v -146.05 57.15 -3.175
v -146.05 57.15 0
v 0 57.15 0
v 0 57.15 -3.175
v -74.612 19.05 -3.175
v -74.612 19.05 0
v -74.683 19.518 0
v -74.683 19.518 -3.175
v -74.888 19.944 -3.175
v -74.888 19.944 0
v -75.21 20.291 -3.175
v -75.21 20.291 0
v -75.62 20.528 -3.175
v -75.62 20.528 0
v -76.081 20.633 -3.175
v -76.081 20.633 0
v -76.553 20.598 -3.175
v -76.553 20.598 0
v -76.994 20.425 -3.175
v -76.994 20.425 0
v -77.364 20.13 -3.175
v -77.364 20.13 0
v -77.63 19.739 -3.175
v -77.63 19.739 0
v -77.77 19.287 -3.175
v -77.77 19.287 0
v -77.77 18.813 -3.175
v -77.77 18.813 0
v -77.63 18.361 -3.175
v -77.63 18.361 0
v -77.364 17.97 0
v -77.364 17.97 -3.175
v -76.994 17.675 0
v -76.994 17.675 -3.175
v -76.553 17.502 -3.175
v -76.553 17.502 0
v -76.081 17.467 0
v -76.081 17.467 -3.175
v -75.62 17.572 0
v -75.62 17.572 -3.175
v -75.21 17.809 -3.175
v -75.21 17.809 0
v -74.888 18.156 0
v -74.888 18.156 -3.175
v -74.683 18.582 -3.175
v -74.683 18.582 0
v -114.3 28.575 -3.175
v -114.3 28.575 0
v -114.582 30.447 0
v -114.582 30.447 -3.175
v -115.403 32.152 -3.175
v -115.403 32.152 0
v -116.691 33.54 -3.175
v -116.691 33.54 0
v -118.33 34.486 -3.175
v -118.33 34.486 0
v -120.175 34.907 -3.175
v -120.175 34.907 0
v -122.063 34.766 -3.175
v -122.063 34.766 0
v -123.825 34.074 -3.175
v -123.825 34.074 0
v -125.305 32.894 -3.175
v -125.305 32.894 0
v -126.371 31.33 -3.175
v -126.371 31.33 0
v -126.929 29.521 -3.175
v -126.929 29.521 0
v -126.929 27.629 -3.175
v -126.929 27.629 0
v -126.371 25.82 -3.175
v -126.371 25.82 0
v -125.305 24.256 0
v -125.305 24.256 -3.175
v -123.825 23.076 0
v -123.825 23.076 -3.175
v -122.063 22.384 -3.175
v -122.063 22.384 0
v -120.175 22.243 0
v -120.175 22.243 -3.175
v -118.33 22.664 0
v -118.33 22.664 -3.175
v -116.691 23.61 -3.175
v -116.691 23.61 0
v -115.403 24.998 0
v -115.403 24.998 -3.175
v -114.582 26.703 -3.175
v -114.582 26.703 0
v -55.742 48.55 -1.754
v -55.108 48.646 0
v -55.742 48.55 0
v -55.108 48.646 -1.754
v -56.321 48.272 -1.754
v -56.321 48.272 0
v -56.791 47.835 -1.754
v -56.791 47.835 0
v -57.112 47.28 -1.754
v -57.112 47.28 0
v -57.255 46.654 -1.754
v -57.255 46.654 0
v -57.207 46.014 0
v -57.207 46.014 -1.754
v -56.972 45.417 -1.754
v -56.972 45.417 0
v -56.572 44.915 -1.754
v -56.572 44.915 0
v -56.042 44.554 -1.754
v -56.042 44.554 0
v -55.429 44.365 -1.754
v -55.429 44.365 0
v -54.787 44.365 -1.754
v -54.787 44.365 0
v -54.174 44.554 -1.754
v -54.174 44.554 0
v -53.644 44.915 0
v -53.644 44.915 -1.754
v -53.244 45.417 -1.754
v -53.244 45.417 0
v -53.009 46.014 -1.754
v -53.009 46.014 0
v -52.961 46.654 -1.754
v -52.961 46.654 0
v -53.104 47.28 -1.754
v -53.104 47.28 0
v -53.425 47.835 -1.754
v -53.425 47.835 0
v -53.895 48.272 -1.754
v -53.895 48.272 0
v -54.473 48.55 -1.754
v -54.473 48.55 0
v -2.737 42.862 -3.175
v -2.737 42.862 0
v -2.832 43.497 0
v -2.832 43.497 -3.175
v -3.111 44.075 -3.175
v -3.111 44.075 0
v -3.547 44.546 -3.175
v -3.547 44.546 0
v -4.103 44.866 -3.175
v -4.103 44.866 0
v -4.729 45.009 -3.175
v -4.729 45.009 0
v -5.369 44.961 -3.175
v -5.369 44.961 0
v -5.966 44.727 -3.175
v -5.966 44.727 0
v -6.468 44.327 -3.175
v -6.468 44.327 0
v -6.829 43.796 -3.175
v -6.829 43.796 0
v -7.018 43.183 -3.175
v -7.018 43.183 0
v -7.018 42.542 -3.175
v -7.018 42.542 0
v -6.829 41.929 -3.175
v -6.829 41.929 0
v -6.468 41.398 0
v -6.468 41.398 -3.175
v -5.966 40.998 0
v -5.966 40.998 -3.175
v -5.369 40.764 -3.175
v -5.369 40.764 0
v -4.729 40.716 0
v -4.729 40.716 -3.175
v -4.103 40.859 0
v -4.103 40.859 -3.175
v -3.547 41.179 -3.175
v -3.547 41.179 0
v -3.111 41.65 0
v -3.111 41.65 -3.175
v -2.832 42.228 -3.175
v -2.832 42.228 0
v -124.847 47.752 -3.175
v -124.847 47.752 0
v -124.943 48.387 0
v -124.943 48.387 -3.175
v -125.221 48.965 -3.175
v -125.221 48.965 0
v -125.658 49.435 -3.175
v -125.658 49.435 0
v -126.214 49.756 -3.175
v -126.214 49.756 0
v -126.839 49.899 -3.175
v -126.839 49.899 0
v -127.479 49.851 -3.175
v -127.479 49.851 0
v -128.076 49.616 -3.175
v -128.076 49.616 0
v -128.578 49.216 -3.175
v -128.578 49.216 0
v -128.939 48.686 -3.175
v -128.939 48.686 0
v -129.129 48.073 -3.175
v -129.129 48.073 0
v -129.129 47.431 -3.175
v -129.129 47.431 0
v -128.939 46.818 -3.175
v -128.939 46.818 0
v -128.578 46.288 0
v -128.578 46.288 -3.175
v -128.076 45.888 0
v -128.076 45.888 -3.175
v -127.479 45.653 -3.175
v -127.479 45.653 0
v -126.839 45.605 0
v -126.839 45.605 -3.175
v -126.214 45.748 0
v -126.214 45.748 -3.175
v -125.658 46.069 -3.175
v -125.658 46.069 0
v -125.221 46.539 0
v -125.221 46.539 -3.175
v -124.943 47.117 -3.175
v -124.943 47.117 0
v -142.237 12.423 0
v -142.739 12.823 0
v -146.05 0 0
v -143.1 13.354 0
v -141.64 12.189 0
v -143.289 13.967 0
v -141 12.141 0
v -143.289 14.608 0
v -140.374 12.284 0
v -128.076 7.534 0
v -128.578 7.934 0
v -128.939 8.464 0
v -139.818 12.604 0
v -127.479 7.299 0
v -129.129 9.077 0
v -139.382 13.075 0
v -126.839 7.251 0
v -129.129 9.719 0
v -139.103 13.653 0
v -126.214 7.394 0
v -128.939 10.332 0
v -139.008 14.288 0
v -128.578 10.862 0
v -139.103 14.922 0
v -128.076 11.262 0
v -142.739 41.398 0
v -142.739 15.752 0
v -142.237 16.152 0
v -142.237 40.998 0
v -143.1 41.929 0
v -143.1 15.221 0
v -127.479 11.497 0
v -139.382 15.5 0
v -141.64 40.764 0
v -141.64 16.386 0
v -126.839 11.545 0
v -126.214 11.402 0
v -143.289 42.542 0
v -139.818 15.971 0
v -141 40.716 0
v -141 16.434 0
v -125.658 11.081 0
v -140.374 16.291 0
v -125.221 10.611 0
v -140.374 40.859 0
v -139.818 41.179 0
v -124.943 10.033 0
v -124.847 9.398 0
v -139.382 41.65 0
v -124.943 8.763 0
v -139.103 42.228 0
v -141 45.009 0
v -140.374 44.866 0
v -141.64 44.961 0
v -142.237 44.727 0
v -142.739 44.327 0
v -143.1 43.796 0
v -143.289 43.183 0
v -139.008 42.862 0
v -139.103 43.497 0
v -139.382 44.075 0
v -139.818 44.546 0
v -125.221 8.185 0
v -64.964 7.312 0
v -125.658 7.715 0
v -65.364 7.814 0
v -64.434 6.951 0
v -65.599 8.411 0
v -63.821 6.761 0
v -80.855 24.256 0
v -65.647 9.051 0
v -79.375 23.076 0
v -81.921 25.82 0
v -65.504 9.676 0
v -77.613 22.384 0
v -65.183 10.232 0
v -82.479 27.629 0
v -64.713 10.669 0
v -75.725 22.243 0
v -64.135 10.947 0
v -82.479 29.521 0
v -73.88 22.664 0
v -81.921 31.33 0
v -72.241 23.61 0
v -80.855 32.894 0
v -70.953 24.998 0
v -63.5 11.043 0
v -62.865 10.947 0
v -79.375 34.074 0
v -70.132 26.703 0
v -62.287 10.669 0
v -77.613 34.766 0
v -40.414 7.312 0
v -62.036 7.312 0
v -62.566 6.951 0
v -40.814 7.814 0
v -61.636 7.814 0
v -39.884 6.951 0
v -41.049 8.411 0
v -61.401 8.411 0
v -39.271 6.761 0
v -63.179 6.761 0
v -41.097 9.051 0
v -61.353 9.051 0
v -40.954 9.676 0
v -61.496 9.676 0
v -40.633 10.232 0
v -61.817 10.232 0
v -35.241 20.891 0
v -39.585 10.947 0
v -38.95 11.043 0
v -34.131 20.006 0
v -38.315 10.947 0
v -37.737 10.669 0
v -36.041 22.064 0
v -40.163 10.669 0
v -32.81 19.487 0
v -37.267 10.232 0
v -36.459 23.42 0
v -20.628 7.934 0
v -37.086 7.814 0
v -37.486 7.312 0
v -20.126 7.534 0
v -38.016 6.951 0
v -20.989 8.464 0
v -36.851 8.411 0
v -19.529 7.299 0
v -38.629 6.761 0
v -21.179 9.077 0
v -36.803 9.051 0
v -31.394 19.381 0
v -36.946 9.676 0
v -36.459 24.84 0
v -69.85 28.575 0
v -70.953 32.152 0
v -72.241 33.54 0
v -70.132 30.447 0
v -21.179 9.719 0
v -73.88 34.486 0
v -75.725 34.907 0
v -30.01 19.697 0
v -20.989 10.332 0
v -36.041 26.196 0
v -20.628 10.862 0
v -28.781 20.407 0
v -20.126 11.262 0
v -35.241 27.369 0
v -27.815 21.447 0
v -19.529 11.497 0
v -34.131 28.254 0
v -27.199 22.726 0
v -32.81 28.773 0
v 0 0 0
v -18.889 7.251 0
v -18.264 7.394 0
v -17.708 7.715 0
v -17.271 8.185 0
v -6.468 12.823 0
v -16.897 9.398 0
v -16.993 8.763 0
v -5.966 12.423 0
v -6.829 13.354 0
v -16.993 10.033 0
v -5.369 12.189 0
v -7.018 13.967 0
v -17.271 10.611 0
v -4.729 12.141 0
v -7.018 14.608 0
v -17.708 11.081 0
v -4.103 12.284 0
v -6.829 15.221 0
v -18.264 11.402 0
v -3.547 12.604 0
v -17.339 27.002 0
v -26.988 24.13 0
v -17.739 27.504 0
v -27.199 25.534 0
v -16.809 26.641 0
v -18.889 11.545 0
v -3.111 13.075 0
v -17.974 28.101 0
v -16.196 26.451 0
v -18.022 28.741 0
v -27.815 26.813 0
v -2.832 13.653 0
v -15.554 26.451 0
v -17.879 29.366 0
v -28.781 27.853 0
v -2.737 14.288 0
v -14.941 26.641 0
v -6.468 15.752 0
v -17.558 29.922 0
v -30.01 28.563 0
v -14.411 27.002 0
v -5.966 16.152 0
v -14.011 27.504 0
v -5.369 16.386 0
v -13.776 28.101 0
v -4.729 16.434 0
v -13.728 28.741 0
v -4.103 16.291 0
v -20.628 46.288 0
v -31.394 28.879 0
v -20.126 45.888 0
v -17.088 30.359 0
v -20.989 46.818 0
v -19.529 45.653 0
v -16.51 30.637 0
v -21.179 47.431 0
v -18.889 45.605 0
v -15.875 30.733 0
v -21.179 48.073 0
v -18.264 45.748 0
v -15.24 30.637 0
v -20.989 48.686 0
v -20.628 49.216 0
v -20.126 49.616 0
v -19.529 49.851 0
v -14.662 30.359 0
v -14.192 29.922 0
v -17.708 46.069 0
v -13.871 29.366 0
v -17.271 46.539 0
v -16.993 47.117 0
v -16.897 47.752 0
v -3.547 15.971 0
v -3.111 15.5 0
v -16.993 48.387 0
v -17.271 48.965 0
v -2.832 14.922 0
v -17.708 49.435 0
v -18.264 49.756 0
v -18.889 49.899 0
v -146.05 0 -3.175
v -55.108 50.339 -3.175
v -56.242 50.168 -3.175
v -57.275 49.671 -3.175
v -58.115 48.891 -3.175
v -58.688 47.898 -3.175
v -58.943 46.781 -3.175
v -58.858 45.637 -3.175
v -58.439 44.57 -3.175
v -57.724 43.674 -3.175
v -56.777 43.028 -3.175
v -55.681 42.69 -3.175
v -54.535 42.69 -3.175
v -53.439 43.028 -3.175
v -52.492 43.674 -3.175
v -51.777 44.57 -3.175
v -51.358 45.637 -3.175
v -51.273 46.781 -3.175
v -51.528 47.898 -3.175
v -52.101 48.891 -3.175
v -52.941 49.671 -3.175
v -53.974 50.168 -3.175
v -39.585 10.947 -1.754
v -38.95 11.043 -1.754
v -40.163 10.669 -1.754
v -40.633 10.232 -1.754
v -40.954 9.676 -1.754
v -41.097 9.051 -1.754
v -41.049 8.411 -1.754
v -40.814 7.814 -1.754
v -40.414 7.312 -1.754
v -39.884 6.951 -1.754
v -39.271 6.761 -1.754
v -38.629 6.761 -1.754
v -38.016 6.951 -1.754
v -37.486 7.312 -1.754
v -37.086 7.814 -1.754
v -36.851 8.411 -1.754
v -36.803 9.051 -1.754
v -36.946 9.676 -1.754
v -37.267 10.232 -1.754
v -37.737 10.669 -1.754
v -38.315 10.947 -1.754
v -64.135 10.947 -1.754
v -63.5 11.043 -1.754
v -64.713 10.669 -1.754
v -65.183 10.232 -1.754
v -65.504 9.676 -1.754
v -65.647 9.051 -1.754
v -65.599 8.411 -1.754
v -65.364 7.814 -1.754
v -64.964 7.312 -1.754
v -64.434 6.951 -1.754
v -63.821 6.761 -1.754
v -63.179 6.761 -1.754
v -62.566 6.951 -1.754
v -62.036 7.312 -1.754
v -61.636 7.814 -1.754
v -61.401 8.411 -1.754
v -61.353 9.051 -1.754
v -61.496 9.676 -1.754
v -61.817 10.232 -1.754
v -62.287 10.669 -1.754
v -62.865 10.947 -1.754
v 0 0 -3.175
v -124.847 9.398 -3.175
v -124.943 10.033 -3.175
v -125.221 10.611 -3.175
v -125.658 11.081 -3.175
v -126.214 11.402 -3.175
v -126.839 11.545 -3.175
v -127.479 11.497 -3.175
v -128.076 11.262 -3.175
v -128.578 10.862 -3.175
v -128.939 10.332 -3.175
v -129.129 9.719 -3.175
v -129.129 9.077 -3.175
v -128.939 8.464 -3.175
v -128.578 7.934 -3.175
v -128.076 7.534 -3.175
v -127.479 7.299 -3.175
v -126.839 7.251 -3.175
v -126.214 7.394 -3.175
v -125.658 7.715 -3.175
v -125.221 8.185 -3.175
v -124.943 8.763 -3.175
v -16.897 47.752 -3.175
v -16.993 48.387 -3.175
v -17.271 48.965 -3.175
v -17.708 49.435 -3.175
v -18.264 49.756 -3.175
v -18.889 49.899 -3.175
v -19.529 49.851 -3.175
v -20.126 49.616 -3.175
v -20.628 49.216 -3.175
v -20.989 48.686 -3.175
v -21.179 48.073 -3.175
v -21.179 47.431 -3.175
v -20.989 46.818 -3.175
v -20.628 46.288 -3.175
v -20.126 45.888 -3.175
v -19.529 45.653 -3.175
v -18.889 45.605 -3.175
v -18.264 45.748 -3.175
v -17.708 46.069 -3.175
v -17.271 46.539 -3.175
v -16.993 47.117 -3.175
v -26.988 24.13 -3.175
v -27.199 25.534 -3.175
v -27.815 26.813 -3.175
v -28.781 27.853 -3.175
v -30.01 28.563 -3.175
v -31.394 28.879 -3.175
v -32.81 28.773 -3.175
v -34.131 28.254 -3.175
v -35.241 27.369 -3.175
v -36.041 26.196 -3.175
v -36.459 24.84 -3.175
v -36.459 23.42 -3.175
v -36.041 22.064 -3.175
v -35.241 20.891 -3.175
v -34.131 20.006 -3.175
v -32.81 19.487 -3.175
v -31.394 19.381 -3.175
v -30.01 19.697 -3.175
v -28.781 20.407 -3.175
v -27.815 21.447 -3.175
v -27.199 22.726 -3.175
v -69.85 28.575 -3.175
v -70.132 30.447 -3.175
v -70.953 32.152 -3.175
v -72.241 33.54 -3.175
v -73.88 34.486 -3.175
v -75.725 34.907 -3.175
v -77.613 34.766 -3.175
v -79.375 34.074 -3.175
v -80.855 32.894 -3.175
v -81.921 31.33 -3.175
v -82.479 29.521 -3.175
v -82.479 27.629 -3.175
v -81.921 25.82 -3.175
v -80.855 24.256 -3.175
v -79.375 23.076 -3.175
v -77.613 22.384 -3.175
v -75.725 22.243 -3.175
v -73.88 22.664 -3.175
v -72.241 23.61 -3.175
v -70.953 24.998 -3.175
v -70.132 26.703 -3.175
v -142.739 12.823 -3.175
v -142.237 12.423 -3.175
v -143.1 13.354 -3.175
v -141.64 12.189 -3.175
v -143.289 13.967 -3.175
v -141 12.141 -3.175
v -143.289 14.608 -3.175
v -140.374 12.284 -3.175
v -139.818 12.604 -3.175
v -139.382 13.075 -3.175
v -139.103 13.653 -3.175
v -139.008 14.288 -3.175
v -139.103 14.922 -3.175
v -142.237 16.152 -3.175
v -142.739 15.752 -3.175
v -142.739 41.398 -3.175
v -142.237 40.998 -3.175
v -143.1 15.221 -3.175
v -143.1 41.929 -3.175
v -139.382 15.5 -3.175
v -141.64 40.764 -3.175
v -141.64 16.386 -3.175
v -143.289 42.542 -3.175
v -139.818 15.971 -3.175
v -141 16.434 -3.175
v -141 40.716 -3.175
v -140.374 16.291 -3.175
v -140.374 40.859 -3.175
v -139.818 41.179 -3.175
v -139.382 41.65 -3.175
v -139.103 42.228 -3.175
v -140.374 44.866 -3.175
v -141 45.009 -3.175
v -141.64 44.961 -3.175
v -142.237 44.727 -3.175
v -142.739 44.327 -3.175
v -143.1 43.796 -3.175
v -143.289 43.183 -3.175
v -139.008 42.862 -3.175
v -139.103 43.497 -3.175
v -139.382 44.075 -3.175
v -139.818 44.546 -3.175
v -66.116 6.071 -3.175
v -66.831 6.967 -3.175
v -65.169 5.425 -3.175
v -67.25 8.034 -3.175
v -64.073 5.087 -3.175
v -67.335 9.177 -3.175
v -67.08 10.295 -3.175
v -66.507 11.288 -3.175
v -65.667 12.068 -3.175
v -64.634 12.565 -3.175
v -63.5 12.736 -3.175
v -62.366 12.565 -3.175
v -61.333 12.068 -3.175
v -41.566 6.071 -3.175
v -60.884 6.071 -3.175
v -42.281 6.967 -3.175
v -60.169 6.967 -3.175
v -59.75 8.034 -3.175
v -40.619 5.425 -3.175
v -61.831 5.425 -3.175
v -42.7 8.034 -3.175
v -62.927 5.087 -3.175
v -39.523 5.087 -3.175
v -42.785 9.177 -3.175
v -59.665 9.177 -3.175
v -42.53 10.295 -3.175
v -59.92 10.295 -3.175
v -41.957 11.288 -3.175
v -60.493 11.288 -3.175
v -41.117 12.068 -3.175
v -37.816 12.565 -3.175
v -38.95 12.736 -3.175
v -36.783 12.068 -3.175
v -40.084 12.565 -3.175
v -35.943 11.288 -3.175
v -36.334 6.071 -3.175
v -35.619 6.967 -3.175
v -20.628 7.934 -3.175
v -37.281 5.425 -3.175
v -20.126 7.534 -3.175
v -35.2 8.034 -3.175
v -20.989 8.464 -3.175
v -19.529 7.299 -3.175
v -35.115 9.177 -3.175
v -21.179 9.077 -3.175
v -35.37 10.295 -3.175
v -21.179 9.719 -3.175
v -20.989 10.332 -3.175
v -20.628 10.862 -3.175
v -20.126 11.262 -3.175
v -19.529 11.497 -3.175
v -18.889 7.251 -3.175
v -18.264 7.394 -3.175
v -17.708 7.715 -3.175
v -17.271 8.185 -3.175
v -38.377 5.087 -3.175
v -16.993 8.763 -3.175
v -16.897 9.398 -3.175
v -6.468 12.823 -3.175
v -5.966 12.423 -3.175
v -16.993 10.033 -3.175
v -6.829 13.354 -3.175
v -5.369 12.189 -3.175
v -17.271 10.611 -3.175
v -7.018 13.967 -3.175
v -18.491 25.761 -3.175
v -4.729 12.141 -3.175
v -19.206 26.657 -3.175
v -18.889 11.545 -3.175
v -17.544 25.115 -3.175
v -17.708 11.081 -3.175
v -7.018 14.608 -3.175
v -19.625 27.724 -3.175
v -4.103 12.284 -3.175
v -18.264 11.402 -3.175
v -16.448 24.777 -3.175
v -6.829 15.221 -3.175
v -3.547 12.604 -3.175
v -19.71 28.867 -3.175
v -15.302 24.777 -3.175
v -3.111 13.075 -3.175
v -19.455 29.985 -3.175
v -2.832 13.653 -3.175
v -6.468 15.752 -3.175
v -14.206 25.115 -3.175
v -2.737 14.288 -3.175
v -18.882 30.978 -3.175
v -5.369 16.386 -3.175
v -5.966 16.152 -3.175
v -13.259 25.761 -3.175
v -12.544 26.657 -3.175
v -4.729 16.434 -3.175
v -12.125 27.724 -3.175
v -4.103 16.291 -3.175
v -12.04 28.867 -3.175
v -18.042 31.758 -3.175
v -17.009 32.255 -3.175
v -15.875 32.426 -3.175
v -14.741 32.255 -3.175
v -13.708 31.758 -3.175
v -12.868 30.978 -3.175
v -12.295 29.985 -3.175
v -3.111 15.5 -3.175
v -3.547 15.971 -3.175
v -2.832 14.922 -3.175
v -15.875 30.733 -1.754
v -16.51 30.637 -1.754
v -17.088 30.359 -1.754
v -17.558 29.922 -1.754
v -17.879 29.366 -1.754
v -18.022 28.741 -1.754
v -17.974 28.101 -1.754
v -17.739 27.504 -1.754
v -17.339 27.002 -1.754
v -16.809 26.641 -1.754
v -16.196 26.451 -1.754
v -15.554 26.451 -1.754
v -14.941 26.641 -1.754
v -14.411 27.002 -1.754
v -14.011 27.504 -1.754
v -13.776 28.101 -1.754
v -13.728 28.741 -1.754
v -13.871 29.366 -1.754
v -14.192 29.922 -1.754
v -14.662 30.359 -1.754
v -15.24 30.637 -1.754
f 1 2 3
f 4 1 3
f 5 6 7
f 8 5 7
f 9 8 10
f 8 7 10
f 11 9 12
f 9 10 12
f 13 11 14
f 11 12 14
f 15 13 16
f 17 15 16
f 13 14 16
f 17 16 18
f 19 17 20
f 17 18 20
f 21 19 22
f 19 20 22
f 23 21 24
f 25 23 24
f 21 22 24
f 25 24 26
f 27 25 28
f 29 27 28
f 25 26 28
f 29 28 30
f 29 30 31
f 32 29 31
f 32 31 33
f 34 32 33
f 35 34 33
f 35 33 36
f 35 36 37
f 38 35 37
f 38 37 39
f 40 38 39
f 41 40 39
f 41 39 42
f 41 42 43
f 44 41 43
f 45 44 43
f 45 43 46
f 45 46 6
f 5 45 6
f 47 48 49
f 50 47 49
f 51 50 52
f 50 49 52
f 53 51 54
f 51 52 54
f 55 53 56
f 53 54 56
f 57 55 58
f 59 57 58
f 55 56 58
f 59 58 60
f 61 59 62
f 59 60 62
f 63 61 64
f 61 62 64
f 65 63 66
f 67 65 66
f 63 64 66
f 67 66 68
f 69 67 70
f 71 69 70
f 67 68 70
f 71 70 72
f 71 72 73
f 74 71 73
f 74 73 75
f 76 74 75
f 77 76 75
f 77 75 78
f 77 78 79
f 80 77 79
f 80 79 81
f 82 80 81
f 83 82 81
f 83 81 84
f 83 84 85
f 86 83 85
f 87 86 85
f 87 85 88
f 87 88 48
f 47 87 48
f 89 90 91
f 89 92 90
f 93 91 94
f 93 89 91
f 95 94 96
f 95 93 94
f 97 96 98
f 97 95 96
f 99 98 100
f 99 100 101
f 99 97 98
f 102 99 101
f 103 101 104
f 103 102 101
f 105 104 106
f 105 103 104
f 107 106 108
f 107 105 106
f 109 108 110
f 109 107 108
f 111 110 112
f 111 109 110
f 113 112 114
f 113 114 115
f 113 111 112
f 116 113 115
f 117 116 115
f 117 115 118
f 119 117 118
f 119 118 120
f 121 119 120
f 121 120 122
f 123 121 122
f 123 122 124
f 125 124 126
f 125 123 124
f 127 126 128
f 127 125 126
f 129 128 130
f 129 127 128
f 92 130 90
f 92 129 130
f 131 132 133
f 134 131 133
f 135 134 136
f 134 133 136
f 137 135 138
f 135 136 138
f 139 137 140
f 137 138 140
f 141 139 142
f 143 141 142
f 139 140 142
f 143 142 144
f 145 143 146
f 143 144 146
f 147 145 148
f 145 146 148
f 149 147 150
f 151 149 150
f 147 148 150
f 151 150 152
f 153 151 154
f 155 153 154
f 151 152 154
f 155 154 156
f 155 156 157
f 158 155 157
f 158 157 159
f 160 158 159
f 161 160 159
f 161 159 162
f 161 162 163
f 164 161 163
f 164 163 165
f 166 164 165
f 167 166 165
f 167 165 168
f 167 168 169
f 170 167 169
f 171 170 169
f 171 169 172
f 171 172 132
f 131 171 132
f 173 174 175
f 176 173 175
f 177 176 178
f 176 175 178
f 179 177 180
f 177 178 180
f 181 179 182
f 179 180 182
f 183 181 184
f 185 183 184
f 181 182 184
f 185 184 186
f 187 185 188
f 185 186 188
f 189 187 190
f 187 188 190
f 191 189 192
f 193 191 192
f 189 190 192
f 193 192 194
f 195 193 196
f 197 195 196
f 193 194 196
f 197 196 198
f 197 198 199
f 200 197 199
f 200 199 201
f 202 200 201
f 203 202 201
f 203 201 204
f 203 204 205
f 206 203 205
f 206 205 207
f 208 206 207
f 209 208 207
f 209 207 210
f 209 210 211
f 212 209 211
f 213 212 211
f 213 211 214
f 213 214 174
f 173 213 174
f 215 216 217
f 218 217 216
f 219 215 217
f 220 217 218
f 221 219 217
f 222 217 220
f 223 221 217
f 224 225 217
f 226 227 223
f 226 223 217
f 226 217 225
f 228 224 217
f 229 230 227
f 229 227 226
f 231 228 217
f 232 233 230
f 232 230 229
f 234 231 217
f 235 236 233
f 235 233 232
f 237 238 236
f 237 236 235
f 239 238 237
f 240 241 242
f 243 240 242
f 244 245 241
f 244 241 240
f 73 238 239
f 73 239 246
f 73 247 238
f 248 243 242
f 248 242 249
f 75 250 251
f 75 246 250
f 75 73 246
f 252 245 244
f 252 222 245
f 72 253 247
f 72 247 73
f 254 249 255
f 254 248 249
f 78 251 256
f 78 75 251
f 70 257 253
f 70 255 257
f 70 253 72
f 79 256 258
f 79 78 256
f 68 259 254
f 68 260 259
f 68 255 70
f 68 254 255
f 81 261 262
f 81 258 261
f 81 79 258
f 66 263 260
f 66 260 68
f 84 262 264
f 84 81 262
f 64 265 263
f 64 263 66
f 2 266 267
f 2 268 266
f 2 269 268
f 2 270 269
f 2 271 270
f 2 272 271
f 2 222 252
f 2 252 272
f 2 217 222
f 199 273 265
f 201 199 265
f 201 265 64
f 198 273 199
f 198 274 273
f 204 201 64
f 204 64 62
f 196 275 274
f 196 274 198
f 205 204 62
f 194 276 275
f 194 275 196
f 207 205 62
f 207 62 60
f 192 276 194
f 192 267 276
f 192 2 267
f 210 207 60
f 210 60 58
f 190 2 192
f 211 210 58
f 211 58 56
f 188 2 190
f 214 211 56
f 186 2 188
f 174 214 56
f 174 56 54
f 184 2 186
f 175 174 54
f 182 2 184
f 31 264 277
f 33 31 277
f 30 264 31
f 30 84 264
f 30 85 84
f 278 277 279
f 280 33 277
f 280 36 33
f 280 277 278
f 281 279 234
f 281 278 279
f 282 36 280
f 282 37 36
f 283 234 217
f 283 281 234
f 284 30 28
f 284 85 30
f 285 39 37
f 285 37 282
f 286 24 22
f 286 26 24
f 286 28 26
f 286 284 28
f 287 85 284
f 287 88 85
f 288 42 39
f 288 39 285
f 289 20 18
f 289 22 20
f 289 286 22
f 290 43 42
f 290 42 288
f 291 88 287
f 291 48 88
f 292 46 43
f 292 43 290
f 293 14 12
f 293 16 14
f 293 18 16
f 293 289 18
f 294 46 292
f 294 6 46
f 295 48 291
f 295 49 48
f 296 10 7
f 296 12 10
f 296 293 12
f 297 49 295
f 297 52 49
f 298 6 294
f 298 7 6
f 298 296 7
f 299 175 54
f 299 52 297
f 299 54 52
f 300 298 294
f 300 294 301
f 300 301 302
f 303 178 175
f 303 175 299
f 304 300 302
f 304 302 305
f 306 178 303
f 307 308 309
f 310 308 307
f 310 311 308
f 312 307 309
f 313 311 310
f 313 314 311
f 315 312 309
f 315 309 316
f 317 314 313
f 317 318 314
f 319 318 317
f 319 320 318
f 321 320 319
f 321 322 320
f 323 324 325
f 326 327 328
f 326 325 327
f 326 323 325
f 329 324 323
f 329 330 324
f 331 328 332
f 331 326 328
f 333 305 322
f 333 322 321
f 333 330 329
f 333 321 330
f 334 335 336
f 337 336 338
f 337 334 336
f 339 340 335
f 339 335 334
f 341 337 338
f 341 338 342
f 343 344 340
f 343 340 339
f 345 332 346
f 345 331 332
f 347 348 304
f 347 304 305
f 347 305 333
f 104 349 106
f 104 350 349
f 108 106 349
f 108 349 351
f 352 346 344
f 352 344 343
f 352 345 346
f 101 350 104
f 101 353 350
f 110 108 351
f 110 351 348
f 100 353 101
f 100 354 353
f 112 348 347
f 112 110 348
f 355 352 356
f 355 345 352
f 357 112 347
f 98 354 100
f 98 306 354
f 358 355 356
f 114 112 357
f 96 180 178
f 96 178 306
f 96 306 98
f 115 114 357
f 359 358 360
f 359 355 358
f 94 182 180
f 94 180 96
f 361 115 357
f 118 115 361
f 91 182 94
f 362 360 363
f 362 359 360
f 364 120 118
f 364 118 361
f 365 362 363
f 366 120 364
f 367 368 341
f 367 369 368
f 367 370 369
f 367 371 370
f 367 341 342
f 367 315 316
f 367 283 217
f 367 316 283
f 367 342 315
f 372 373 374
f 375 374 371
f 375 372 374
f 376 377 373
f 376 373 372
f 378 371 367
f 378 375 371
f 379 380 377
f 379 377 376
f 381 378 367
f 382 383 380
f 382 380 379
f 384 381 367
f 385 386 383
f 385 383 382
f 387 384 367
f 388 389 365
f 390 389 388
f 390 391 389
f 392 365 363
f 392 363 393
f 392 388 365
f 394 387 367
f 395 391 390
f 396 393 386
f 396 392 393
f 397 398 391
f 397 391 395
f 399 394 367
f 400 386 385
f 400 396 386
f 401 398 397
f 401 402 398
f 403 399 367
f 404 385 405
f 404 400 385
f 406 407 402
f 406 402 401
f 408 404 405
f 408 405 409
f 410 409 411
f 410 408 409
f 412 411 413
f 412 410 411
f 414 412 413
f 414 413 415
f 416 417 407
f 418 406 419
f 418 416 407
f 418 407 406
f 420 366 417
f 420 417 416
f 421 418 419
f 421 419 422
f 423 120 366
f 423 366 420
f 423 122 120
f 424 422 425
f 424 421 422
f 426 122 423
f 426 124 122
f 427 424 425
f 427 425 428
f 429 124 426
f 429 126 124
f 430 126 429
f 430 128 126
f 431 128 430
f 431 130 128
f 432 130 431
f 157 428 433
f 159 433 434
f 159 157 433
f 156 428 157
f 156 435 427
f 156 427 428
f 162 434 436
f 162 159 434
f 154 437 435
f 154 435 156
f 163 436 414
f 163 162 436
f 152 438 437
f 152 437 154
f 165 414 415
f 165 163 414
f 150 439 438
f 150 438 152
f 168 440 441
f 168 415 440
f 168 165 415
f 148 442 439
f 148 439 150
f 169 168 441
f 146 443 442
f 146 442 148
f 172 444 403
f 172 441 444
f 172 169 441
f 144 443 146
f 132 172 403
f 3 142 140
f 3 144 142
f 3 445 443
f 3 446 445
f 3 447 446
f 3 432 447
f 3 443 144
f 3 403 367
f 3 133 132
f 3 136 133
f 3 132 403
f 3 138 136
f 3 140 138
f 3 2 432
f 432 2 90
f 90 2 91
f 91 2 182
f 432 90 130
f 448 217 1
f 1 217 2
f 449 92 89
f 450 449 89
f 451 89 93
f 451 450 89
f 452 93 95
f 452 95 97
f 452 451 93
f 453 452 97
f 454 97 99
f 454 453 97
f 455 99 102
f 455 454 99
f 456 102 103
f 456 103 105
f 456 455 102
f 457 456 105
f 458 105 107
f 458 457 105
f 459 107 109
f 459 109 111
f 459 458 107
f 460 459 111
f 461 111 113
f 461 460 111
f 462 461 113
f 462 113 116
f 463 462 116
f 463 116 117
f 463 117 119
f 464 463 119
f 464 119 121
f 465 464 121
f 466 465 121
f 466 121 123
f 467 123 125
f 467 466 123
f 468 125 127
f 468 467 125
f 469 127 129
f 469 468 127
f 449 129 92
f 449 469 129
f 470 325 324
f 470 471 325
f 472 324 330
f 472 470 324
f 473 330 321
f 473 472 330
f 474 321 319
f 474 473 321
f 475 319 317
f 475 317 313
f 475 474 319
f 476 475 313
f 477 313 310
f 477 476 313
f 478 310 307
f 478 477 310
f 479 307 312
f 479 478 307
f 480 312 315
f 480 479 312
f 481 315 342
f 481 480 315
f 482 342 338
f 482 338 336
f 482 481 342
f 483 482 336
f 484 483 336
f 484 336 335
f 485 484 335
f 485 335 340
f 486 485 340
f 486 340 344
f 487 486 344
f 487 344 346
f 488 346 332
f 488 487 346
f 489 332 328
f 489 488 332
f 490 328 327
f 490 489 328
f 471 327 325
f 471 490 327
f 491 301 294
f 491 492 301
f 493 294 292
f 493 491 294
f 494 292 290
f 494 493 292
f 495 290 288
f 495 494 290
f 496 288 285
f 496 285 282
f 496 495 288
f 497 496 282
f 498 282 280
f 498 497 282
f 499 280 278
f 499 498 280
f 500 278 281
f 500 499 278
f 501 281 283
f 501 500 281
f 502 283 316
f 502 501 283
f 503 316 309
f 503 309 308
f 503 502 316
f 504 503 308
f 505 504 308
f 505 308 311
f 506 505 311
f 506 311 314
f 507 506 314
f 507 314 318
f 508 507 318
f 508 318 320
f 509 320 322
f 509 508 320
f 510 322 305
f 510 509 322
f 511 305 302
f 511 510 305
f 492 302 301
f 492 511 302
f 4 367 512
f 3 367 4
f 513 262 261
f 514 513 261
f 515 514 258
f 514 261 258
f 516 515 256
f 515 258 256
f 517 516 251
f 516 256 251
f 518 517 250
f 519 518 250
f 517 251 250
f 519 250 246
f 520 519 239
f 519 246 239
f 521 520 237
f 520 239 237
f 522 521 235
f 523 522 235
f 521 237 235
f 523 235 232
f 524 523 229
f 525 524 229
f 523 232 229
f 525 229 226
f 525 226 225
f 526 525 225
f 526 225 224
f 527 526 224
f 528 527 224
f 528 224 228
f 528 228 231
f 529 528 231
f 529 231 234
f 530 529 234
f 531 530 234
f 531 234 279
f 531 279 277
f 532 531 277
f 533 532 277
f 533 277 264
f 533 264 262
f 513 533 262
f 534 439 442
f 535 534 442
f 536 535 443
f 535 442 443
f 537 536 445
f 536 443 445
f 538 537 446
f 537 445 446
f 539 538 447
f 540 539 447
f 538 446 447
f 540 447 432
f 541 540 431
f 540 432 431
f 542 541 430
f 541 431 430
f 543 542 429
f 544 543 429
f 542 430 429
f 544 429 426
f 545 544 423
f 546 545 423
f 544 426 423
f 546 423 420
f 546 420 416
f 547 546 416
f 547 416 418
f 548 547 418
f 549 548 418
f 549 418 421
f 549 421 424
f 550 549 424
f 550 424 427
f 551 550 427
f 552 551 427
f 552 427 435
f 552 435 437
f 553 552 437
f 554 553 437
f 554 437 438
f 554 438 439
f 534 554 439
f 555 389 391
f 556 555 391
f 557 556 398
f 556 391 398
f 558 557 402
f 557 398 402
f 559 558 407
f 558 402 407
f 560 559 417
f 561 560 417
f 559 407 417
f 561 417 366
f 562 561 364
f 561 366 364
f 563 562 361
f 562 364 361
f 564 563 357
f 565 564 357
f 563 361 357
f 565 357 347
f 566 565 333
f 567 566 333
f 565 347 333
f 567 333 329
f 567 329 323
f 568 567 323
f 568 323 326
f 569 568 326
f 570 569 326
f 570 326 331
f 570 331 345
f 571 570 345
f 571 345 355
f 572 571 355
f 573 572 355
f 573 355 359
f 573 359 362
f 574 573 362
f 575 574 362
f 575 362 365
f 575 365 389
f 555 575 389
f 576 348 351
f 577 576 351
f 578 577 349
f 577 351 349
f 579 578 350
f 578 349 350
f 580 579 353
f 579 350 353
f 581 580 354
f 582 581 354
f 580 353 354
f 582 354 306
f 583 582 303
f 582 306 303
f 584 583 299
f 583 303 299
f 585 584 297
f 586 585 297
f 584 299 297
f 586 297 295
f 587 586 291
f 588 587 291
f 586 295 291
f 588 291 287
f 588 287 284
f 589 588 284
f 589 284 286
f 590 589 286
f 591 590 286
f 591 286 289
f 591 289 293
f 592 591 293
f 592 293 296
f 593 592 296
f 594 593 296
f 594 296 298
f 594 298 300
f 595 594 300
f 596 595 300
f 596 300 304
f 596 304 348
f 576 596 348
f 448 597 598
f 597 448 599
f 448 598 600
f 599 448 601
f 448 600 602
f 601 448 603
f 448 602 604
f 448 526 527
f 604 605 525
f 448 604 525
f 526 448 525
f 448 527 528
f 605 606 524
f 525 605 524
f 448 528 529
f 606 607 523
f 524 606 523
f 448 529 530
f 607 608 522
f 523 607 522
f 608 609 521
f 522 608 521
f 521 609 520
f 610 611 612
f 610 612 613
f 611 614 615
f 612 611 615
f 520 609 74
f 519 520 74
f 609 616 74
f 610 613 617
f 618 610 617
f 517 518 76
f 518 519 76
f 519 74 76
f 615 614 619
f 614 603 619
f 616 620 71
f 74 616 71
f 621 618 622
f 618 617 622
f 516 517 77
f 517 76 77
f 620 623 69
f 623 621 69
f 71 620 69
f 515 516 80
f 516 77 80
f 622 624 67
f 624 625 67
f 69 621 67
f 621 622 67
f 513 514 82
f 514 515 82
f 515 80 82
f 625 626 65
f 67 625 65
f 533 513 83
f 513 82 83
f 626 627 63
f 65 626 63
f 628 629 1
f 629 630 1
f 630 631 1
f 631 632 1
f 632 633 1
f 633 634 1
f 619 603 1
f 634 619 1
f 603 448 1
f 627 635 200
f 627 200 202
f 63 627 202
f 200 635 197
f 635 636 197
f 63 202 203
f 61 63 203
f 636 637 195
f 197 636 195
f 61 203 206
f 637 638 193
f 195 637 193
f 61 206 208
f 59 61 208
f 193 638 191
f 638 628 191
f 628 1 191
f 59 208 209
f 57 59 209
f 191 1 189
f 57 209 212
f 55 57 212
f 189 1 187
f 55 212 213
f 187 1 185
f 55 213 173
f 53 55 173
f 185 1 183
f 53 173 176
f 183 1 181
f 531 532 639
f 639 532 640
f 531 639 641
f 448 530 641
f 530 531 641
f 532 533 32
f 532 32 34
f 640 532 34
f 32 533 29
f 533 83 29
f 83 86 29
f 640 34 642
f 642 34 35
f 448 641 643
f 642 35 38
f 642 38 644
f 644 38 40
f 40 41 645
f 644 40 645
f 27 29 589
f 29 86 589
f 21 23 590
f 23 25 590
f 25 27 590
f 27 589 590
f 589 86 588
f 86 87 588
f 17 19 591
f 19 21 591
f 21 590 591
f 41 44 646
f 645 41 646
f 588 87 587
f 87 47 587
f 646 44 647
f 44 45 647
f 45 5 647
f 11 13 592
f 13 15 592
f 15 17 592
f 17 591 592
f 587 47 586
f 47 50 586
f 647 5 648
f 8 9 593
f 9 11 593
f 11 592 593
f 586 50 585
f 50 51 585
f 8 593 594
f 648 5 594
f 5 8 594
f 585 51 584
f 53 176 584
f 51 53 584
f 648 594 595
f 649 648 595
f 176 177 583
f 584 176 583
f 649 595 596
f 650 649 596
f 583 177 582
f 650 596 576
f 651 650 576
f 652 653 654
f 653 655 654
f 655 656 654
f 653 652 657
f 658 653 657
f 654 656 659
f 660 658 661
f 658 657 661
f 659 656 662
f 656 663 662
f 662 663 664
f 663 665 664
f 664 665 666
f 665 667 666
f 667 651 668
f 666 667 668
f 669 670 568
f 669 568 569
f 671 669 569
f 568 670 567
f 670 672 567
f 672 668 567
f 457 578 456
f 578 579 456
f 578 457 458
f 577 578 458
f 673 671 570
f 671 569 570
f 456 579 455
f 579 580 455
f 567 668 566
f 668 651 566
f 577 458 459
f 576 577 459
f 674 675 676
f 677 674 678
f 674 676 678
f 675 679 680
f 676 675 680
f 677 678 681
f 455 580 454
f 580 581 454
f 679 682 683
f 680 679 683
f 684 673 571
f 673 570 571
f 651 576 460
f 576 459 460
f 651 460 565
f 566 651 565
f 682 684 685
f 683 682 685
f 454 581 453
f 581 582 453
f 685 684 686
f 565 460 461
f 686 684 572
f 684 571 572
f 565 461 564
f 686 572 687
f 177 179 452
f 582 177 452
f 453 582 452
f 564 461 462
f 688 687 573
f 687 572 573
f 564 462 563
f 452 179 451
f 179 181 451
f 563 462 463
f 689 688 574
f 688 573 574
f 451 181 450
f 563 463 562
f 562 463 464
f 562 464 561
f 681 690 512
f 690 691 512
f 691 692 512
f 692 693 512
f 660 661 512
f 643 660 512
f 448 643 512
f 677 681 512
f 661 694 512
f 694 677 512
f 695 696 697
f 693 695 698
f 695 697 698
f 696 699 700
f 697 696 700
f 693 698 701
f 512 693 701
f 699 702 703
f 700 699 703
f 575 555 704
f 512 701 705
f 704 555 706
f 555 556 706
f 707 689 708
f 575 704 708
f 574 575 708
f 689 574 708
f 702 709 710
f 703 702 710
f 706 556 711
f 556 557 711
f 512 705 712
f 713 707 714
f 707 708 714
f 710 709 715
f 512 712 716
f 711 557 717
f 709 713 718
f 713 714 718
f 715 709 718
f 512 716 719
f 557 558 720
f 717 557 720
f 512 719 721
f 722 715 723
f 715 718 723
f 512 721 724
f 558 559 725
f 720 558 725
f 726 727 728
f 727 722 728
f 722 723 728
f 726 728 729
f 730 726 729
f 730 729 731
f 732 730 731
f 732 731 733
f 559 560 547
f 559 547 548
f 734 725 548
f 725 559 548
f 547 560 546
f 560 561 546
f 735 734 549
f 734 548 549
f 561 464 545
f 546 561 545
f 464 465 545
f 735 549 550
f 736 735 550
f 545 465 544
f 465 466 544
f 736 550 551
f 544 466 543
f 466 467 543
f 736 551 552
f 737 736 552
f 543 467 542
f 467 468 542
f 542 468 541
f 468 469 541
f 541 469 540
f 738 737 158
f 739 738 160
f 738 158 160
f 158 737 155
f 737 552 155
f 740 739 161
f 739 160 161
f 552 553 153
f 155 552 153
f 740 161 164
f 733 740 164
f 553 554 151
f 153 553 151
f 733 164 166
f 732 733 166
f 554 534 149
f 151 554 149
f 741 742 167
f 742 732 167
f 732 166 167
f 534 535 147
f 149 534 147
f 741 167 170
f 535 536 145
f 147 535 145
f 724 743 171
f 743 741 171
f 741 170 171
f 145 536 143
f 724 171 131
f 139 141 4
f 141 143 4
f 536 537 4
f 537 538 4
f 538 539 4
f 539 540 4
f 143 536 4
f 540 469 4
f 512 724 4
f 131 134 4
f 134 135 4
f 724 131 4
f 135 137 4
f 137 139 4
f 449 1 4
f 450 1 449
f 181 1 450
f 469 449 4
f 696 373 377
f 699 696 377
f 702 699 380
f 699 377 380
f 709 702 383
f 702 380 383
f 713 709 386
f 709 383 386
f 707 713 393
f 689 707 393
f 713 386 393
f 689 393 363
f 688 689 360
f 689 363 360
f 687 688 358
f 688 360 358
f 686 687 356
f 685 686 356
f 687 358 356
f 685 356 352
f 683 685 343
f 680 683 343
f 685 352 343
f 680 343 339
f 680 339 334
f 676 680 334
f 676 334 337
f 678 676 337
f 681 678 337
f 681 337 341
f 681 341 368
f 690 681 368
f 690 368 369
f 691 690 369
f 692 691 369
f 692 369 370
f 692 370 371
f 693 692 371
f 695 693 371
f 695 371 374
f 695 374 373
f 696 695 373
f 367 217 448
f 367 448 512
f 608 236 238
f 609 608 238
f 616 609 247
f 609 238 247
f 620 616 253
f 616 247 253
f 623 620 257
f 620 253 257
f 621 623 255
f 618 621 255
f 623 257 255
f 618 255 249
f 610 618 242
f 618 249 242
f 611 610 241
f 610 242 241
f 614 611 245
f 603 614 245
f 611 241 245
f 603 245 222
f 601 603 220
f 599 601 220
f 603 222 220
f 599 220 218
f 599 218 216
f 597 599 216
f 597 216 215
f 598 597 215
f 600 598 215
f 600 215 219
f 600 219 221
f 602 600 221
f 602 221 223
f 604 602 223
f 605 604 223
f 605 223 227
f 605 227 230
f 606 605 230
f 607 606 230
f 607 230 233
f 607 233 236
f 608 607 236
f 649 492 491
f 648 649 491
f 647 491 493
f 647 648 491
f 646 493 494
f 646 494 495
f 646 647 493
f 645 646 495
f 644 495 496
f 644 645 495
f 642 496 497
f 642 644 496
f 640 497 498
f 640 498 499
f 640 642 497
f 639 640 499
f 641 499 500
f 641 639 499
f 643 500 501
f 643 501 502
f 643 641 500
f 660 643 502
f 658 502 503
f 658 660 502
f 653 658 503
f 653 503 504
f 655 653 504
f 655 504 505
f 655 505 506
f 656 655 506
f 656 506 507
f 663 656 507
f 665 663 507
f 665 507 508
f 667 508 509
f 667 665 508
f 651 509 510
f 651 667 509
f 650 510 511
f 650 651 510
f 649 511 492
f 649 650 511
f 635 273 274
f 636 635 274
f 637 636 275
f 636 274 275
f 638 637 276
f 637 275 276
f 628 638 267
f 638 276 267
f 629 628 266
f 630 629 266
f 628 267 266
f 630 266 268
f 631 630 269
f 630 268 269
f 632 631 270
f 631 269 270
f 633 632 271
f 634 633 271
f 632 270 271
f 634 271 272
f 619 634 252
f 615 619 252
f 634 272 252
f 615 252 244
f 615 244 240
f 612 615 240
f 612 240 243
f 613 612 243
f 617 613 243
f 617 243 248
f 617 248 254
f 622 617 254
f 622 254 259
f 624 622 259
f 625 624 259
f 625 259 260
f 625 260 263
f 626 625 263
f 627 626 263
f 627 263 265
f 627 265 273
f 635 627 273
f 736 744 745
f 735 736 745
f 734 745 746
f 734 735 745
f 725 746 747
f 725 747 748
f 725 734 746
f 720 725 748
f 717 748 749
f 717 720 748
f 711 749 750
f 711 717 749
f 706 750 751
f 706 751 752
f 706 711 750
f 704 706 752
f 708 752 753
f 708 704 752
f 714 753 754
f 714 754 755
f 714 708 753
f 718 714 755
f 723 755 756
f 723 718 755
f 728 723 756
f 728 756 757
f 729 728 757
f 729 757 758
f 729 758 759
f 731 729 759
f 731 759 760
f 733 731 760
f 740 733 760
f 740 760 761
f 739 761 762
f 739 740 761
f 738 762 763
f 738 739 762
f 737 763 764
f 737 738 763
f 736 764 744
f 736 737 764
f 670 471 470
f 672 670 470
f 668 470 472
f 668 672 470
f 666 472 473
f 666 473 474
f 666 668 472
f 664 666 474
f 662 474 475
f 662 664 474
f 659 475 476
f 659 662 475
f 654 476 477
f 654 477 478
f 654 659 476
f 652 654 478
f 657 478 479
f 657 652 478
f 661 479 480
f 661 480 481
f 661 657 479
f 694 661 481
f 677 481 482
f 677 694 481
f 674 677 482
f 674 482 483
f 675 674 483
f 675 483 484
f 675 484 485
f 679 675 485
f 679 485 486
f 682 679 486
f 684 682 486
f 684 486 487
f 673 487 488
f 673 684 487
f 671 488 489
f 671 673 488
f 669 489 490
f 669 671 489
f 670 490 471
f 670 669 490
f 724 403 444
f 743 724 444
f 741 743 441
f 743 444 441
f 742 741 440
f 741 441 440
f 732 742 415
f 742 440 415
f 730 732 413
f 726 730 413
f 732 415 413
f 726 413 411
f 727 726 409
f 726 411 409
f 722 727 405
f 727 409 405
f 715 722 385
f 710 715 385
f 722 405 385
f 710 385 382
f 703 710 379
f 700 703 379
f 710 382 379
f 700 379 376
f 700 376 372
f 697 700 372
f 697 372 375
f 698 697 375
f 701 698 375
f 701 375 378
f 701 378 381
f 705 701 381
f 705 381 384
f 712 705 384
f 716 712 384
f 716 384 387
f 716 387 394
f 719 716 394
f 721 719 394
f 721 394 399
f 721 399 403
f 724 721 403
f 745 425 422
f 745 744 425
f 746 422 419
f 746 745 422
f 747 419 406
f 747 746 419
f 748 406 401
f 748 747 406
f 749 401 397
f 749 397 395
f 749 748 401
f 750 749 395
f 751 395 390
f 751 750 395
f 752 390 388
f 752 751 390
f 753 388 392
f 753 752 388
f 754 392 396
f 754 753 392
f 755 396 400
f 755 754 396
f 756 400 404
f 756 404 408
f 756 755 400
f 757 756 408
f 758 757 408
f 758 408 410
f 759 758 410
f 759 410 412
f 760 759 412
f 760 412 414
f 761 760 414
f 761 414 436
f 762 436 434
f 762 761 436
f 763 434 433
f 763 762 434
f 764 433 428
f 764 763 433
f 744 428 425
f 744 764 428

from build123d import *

# Parameters (mm, degrees)
SKETCH1_W                                 = 146.05
SKETCH1_H                                 = 57.15
BOSS_EXTRUDE1_DEPTH                       = 3.175
F_6_CLEARANCE_HOLE1_D                     = 4.3053
F_1_2_0_5_DIAMETER_HOLE1_D                = 12.7
F_3_8_0_375_DIAMETER_HOLE1_D              = 9.525
F_1_8_0_125_DIAMETER_HOLE1_D              = 3.175
CSK_FOR_6_FLAT_HEAD_MACHINE_SCREW_2_COUNT = 2
CSK_FOR_6_FLAT_HEAD_MACHINE_SCREW_2_PITCH = 38.528341037
CSK_FOR_6_FLAT_HEAD_MACHINE_SCREW_3_COUNT = 2
CSK_FOR_6_FLAT_HEAD_MACHINE_SCREW_3_PITCH = 51.534810808
CSK_FOR_6_FLAT_HEAD_MACHINE_SCREW_4_COUNT = 2
CSK_FOR_6_FLAT_HEAD_MACHINE_SCREW_4_PITCH = 24.55


with BuildPart() as part:
    # Sketch1 → Boss-Extrude1 (new body)
    with BuildSketch(Plane.XY):
        with Locations((-73.025, 28.575)):
            Rectangle(SKETCH1_W, SKETCH1_H)
    extrude(amount=-BOSS_EXTRUDE1_DEPTH)

    # #6 Clearance Hole1 (through all)
    with Locations(Plane(origin=(0, 0, -3.175), x_dir=(-1, 0, 0), z_dir=(0, 0, -1))):
        with Locations((4.8895, 42.8625), (141.1605, 42.8625), (141.1605, 14.2875), (4.8895, 14.2875), (19.05, 47.752), (19.05, 9.398), (127, 9.398), (127, 47.752)):
            Hole(F_6_CLEARANCE_HOLE1_D / 2)

    # 1/2 (0.5) Diameter Hole1 (through all)
    with Locations(Plane(origin=(0, 0, -3.175), x_dir=(-1, 0, 0), z_dir=(0, 0, -1))):
        with Locations((76.2, 28.575), (120.65, 28.575)):
            Hole(F_1_2_0_5_DIAMETER_HOLE1_D / 2)

    # 3/8 (0.375) Diameter Hole1 (through all)
    with Locations(Plane(origin=(0, 0, -3.175), x_dir=(-1, 0, 0), z_dir=(0, 0, -1))):
        with Locations((31.75, 24.13)):
            Hole(F_3_8_0_375_DIAMETER_HOLE1_D / 2)

    # 1/8 (0.125) Diameter Hole1 (through all)
    with Locations(Plane(origin=(0, 0, -3.175), x_dir=(-1, 0, 0), z_dir=(0, 0, -1))):
        with Locations((76.2, 19.05)):
            Hole(F_1_8_0_125_DIAMETER_HOLE1_D / 2)

    # Sketch14 → CSK for #6 Flat Head Machine Screw (100)2 (revolve, cut)
    with BuildSketch(Plane(origin=(-63.5, 8.89, -3.175), x_dir=(0, 1, 0), z_dir=(1, 0, 0))):
        Polygon((0, 0), (0, 3.175), (2.15265, 3.175), (2.15265, 1.420893136), (3.8460045, 0), align=None)
    csk_for_6_flat_head_machine_screw_100 = revolve(axis=Axis((-63.5, 8.89, -9.525), (0, 0, 1)), mode=Mode.SUBTRACT)

    # CSK for _6 Flat Head Machine Screw _ 2: CSK for #6 Flat Head Machine Screw (100)2 ×2
    with Locations(*[Vector(0.217814006, 0.975990296, 0) * (i * CSK_FOR_6_FLAT_HEAD_MACHINE_SCREW_2_PITCH) for i in range(1, CSK_FOR_6_FLAT_HEAD_MACHINE_SCREW_2_COUNT)]):
        add(csk_for_6_flat_head_machine_screw_100, mode=Mode.SUBTRACT)

    # CSK for _6 Flat Head Machine Screw _ 3: CSK for #6 Flat Head Machine Screw (100)2 ×2
    with Locations(*[Vector(0.924132625, 0.38207184, 0) * (i * CSK_FOR_6_FLAT_HEAD_MACHINE_SCREW_3_PITCH) for i in range(1, CSK_FOR_6_FLAT_HEAD_MACHINE_SCREW_3_COUNT)]):
        add(csk_for_6_flat_head_machine_screw_100, mode=Mode.SUBTRACT)

    # CSK for _6 Flat Head Machine Screw _ 4: CSK for #6 Flat Head Machine Screw (100)2 ×2
    with Locations(*[(i * CSK_FOR_6_FLAT_HEAD_MACHINE_SCREW_4_PITCH, 0, 0) for i in range(1, CSK_FOR_6_FLAT_HEAD_MACHINE_SCREW_4_COUNT)]):
        add(csk_for_6_flat_head_machine_screw_100, mode=Mode.SUBTRACT)


solid = part.part
